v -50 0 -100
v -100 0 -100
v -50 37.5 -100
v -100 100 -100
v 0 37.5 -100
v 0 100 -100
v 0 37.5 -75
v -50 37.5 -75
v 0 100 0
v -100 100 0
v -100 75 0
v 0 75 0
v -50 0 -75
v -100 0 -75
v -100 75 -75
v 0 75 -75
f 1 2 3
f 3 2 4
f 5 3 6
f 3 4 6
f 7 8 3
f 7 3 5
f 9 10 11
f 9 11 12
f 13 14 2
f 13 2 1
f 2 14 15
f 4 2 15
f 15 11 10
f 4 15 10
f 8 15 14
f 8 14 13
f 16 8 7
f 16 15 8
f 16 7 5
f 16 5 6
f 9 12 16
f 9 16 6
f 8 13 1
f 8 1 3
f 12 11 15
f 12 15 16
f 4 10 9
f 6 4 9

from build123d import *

# Parameters (mm, degrees)
F0_W     = 100
F0_H     = 100
F1_DEPTH = 100
F2_W     = 100
F2_H     = 75
F3_DEPTH = 75
F4_W     = 50
F4_H     = 37.5
F5_DEPTH = 25.001


with BuildPart() as f1:
    # F0 (on Top) → F1 (new body)
    with BuildSketch(Plane.XY):
        with Locations((-50, 50)):
            Rectangle(F0_W, F0_H)
    extrude(amount=-F1_DEPTH)

    # F2 (on face) → F3 (cut)
    with BuildSketch(Plane.XY):
        with Locations((-50, 37.5)):
            Rectangle(F2_W, F2_H)
    extrude(amount=-F3_DEPTH, mode=Mode.SUBTRACT)

    # F4 (on face) → F5 (cut, through all)
    with BuildSketch(Plane.XY.offset(-75)):
        with Locations((-25, 18.75)):
            Rectangle(F4_W, F4_H)
    extrude(amount=-F5_DEPTH, mode=Mode.SUBTRACT)


solid = f1.part
